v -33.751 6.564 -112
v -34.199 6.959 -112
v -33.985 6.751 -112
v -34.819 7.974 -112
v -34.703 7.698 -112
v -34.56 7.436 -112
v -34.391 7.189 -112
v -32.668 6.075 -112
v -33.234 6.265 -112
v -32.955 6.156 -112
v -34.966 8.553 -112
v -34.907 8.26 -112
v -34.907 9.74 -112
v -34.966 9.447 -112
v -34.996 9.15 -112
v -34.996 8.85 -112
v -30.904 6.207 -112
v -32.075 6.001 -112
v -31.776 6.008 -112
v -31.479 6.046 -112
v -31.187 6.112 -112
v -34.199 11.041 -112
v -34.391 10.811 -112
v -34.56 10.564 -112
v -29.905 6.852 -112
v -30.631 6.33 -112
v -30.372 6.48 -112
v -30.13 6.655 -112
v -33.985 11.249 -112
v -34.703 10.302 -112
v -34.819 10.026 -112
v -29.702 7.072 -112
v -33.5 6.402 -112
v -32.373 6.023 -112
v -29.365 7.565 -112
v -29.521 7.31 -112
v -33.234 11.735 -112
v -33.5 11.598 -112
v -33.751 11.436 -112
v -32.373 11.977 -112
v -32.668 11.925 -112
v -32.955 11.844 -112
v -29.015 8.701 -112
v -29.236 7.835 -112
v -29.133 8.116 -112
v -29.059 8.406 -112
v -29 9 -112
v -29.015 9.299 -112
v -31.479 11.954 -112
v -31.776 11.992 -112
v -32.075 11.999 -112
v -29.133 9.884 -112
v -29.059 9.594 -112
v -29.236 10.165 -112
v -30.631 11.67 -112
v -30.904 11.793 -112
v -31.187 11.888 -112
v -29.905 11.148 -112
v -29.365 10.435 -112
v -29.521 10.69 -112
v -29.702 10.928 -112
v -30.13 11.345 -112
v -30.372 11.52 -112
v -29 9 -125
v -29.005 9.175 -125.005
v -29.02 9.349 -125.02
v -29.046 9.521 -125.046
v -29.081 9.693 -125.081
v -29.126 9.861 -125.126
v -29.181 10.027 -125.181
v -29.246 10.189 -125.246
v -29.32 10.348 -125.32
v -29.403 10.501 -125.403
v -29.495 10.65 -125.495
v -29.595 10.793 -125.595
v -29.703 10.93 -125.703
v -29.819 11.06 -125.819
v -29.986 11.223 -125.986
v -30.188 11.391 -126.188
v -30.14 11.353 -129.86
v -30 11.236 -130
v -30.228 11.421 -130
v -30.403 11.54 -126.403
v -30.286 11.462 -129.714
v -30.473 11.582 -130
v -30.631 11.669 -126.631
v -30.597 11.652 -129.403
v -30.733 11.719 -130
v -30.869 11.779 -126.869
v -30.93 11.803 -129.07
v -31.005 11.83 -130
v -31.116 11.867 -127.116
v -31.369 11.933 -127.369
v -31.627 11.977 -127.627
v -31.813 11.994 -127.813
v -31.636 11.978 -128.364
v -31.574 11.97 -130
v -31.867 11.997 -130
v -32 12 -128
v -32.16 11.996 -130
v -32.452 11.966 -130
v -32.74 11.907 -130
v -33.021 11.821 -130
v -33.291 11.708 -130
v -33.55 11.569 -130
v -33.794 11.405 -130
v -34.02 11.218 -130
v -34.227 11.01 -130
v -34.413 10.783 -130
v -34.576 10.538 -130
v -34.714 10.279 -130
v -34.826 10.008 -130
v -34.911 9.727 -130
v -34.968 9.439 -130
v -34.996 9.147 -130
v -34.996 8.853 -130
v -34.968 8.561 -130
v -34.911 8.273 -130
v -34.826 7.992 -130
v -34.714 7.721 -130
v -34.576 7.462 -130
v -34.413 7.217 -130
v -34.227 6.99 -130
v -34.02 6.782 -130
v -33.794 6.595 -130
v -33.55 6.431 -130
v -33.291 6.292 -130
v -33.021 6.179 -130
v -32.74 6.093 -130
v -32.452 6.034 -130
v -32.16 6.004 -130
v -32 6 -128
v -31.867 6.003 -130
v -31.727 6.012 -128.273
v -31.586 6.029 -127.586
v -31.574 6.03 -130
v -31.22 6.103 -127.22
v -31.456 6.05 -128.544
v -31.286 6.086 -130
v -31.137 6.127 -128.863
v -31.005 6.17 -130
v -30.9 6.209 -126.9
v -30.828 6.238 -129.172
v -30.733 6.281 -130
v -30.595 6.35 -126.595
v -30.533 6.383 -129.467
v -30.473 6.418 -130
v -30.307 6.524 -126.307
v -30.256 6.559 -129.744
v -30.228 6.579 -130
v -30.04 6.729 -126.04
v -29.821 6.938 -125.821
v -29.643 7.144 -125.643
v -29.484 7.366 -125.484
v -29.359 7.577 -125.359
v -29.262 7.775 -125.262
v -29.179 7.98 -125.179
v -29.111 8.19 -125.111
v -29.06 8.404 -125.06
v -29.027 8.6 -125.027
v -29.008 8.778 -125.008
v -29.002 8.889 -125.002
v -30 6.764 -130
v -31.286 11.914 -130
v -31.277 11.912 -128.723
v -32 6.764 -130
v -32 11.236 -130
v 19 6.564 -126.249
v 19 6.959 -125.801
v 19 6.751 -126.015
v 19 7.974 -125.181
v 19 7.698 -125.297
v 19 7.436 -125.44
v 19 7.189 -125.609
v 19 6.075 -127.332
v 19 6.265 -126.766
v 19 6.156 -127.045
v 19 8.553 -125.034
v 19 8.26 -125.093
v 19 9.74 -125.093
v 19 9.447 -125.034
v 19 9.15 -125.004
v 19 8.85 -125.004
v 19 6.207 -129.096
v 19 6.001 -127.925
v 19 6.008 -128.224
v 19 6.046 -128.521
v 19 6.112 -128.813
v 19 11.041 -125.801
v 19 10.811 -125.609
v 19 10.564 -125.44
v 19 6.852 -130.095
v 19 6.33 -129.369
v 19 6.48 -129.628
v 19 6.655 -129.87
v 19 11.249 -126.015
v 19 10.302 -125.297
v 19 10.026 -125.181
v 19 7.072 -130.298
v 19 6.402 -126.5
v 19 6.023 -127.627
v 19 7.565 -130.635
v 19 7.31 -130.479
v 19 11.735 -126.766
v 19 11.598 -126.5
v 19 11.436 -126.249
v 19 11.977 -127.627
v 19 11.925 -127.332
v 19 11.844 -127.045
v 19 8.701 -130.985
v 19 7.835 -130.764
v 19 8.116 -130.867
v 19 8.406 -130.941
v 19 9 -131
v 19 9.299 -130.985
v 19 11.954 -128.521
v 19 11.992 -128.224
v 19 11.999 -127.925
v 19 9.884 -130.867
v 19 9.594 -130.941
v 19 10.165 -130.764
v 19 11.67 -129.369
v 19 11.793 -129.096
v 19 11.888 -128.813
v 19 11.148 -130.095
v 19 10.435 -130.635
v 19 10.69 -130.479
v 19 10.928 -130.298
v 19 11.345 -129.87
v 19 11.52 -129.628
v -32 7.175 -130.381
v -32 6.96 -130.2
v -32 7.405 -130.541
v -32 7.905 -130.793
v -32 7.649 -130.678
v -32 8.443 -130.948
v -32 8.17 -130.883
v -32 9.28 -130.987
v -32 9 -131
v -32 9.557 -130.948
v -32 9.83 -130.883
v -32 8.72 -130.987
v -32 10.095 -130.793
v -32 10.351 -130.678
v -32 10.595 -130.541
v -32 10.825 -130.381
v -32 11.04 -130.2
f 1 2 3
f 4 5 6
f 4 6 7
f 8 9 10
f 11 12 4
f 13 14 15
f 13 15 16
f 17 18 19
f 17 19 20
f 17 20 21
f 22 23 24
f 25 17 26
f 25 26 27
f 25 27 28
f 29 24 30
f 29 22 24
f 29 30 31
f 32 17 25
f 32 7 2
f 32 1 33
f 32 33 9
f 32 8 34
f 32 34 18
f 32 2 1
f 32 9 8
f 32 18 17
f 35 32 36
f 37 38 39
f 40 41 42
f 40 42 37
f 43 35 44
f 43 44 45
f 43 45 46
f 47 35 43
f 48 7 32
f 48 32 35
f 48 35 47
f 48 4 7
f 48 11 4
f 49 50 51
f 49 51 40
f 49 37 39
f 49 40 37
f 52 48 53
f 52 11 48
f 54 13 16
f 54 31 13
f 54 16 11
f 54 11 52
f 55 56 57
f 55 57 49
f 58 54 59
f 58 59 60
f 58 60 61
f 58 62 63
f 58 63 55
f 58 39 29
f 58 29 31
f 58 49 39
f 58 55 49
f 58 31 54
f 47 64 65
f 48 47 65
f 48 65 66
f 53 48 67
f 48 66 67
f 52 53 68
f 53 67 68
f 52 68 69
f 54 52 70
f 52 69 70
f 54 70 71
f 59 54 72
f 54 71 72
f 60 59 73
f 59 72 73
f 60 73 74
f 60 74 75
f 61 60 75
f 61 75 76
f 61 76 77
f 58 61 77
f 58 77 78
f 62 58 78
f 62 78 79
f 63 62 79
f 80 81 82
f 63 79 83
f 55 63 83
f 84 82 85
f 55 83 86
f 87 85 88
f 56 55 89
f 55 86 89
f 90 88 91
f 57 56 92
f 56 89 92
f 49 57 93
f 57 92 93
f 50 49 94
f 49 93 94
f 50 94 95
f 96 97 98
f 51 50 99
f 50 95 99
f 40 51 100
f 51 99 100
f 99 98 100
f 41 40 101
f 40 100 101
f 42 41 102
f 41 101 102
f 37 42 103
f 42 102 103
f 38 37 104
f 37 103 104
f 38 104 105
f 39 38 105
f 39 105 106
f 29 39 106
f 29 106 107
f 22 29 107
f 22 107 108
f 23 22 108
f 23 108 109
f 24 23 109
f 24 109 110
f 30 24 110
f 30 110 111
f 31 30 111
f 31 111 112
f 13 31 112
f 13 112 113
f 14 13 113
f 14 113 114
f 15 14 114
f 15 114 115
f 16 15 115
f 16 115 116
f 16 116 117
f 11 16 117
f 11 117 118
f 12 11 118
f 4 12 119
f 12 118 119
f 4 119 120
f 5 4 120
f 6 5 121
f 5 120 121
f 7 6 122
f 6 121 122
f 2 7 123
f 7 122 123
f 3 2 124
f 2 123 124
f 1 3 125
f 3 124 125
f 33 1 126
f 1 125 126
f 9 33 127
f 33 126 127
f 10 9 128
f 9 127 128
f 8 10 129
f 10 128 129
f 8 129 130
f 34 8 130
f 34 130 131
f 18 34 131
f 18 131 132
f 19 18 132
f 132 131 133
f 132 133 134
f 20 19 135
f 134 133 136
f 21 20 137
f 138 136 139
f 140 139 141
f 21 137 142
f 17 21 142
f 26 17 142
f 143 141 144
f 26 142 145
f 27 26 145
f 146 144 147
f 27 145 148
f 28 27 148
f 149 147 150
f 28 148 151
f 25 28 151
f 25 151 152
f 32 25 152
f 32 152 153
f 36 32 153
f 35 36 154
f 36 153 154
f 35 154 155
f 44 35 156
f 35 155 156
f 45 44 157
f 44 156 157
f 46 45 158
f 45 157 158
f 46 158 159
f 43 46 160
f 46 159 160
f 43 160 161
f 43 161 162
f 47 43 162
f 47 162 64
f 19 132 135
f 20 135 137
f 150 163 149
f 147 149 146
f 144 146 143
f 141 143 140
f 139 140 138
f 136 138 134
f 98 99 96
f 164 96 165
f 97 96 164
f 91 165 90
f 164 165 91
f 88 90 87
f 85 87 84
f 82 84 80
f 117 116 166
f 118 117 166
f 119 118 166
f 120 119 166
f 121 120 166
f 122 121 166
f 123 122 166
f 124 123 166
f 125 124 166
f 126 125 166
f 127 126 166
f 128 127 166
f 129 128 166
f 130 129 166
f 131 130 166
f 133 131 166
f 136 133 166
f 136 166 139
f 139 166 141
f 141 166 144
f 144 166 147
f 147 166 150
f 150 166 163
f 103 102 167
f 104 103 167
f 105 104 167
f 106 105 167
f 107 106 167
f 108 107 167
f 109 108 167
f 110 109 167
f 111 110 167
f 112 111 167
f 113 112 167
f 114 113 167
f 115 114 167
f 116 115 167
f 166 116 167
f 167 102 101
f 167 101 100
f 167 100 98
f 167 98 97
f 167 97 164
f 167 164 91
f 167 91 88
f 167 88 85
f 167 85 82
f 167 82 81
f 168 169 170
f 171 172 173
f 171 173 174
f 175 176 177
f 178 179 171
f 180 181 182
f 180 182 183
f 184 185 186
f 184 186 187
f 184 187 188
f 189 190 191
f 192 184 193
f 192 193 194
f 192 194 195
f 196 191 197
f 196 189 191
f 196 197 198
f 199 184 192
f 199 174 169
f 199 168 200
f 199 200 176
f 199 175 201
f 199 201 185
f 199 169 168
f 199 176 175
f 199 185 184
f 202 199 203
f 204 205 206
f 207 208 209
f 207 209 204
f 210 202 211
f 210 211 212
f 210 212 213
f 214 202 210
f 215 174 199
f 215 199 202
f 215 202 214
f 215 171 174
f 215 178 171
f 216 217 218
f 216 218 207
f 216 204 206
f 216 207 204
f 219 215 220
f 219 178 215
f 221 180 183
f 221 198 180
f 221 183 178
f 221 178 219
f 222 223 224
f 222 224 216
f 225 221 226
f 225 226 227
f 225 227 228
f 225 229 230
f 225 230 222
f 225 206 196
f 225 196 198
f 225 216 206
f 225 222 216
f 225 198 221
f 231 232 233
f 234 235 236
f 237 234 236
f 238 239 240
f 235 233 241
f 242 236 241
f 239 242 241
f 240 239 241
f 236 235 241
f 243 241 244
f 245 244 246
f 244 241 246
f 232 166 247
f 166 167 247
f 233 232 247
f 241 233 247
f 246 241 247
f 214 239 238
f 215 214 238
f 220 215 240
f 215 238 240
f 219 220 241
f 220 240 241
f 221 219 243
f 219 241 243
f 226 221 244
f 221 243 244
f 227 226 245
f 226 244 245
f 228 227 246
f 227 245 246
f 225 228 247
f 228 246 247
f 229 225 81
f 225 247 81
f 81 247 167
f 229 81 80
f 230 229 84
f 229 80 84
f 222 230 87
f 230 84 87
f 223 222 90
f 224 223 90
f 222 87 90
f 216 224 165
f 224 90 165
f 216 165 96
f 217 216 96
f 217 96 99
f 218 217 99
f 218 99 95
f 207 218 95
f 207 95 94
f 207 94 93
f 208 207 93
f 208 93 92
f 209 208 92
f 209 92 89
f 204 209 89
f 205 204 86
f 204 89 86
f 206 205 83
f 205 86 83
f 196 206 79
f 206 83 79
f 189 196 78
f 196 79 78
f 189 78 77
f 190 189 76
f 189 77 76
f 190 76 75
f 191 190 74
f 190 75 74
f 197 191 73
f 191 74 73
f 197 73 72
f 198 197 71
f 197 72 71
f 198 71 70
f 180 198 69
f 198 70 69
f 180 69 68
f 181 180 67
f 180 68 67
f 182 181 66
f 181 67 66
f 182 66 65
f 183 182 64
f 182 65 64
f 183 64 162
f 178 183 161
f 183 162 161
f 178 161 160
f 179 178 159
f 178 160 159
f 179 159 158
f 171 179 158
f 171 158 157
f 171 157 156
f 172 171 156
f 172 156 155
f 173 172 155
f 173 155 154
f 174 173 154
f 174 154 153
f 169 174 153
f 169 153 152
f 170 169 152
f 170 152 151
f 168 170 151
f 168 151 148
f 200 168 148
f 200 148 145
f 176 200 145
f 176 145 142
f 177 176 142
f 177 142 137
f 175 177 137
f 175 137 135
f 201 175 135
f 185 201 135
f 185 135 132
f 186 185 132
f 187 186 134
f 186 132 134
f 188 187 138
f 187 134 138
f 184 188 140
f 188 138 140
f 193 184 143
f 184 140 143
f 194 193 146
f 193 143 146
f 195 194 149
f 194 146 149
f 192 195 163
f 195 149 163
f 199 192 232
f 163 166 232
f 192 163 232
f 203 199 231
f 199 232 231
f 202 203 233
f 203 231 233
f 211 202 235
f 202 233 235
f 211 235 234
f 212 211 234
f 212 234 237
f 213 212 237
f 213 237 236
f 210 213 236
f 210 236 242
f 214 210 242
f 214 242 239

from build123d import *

# Parameters (mm, degrees)
CYLINDER051_R     = 3
CYLINDER051_DEPTH = 18
CYLINDER050_R     = 3
CYLINDER050_DEPTH = 51


with BuildPart() as cylindre047:
    # Cylinder051 → Cylinder051 (new body)
    with BuildSketch(Plane(origin=(-32, 9, -130), x_dir=(1, 0, 0), z_dir=(0, 0, 1))):
        Circle(CYLINDER051_R)
    extrude(amount=CYLINDER051_DEPTH)


with BuildPart() as fusion025:
    # Cylinder050 → Cylinder050 (new body)
    with BuildSketch(Plane(origin=(-32, 9, -128), x_dir=(0, 0, -1), z_dir=(1, 0, 0))):
        Circle(CYLINDER050_R)
    extrude(amount=CYLINDER050_DEPTH)

    # Fusion025: union Cylindre047
    add(cylindre047.part)


solid = fusion025.part
